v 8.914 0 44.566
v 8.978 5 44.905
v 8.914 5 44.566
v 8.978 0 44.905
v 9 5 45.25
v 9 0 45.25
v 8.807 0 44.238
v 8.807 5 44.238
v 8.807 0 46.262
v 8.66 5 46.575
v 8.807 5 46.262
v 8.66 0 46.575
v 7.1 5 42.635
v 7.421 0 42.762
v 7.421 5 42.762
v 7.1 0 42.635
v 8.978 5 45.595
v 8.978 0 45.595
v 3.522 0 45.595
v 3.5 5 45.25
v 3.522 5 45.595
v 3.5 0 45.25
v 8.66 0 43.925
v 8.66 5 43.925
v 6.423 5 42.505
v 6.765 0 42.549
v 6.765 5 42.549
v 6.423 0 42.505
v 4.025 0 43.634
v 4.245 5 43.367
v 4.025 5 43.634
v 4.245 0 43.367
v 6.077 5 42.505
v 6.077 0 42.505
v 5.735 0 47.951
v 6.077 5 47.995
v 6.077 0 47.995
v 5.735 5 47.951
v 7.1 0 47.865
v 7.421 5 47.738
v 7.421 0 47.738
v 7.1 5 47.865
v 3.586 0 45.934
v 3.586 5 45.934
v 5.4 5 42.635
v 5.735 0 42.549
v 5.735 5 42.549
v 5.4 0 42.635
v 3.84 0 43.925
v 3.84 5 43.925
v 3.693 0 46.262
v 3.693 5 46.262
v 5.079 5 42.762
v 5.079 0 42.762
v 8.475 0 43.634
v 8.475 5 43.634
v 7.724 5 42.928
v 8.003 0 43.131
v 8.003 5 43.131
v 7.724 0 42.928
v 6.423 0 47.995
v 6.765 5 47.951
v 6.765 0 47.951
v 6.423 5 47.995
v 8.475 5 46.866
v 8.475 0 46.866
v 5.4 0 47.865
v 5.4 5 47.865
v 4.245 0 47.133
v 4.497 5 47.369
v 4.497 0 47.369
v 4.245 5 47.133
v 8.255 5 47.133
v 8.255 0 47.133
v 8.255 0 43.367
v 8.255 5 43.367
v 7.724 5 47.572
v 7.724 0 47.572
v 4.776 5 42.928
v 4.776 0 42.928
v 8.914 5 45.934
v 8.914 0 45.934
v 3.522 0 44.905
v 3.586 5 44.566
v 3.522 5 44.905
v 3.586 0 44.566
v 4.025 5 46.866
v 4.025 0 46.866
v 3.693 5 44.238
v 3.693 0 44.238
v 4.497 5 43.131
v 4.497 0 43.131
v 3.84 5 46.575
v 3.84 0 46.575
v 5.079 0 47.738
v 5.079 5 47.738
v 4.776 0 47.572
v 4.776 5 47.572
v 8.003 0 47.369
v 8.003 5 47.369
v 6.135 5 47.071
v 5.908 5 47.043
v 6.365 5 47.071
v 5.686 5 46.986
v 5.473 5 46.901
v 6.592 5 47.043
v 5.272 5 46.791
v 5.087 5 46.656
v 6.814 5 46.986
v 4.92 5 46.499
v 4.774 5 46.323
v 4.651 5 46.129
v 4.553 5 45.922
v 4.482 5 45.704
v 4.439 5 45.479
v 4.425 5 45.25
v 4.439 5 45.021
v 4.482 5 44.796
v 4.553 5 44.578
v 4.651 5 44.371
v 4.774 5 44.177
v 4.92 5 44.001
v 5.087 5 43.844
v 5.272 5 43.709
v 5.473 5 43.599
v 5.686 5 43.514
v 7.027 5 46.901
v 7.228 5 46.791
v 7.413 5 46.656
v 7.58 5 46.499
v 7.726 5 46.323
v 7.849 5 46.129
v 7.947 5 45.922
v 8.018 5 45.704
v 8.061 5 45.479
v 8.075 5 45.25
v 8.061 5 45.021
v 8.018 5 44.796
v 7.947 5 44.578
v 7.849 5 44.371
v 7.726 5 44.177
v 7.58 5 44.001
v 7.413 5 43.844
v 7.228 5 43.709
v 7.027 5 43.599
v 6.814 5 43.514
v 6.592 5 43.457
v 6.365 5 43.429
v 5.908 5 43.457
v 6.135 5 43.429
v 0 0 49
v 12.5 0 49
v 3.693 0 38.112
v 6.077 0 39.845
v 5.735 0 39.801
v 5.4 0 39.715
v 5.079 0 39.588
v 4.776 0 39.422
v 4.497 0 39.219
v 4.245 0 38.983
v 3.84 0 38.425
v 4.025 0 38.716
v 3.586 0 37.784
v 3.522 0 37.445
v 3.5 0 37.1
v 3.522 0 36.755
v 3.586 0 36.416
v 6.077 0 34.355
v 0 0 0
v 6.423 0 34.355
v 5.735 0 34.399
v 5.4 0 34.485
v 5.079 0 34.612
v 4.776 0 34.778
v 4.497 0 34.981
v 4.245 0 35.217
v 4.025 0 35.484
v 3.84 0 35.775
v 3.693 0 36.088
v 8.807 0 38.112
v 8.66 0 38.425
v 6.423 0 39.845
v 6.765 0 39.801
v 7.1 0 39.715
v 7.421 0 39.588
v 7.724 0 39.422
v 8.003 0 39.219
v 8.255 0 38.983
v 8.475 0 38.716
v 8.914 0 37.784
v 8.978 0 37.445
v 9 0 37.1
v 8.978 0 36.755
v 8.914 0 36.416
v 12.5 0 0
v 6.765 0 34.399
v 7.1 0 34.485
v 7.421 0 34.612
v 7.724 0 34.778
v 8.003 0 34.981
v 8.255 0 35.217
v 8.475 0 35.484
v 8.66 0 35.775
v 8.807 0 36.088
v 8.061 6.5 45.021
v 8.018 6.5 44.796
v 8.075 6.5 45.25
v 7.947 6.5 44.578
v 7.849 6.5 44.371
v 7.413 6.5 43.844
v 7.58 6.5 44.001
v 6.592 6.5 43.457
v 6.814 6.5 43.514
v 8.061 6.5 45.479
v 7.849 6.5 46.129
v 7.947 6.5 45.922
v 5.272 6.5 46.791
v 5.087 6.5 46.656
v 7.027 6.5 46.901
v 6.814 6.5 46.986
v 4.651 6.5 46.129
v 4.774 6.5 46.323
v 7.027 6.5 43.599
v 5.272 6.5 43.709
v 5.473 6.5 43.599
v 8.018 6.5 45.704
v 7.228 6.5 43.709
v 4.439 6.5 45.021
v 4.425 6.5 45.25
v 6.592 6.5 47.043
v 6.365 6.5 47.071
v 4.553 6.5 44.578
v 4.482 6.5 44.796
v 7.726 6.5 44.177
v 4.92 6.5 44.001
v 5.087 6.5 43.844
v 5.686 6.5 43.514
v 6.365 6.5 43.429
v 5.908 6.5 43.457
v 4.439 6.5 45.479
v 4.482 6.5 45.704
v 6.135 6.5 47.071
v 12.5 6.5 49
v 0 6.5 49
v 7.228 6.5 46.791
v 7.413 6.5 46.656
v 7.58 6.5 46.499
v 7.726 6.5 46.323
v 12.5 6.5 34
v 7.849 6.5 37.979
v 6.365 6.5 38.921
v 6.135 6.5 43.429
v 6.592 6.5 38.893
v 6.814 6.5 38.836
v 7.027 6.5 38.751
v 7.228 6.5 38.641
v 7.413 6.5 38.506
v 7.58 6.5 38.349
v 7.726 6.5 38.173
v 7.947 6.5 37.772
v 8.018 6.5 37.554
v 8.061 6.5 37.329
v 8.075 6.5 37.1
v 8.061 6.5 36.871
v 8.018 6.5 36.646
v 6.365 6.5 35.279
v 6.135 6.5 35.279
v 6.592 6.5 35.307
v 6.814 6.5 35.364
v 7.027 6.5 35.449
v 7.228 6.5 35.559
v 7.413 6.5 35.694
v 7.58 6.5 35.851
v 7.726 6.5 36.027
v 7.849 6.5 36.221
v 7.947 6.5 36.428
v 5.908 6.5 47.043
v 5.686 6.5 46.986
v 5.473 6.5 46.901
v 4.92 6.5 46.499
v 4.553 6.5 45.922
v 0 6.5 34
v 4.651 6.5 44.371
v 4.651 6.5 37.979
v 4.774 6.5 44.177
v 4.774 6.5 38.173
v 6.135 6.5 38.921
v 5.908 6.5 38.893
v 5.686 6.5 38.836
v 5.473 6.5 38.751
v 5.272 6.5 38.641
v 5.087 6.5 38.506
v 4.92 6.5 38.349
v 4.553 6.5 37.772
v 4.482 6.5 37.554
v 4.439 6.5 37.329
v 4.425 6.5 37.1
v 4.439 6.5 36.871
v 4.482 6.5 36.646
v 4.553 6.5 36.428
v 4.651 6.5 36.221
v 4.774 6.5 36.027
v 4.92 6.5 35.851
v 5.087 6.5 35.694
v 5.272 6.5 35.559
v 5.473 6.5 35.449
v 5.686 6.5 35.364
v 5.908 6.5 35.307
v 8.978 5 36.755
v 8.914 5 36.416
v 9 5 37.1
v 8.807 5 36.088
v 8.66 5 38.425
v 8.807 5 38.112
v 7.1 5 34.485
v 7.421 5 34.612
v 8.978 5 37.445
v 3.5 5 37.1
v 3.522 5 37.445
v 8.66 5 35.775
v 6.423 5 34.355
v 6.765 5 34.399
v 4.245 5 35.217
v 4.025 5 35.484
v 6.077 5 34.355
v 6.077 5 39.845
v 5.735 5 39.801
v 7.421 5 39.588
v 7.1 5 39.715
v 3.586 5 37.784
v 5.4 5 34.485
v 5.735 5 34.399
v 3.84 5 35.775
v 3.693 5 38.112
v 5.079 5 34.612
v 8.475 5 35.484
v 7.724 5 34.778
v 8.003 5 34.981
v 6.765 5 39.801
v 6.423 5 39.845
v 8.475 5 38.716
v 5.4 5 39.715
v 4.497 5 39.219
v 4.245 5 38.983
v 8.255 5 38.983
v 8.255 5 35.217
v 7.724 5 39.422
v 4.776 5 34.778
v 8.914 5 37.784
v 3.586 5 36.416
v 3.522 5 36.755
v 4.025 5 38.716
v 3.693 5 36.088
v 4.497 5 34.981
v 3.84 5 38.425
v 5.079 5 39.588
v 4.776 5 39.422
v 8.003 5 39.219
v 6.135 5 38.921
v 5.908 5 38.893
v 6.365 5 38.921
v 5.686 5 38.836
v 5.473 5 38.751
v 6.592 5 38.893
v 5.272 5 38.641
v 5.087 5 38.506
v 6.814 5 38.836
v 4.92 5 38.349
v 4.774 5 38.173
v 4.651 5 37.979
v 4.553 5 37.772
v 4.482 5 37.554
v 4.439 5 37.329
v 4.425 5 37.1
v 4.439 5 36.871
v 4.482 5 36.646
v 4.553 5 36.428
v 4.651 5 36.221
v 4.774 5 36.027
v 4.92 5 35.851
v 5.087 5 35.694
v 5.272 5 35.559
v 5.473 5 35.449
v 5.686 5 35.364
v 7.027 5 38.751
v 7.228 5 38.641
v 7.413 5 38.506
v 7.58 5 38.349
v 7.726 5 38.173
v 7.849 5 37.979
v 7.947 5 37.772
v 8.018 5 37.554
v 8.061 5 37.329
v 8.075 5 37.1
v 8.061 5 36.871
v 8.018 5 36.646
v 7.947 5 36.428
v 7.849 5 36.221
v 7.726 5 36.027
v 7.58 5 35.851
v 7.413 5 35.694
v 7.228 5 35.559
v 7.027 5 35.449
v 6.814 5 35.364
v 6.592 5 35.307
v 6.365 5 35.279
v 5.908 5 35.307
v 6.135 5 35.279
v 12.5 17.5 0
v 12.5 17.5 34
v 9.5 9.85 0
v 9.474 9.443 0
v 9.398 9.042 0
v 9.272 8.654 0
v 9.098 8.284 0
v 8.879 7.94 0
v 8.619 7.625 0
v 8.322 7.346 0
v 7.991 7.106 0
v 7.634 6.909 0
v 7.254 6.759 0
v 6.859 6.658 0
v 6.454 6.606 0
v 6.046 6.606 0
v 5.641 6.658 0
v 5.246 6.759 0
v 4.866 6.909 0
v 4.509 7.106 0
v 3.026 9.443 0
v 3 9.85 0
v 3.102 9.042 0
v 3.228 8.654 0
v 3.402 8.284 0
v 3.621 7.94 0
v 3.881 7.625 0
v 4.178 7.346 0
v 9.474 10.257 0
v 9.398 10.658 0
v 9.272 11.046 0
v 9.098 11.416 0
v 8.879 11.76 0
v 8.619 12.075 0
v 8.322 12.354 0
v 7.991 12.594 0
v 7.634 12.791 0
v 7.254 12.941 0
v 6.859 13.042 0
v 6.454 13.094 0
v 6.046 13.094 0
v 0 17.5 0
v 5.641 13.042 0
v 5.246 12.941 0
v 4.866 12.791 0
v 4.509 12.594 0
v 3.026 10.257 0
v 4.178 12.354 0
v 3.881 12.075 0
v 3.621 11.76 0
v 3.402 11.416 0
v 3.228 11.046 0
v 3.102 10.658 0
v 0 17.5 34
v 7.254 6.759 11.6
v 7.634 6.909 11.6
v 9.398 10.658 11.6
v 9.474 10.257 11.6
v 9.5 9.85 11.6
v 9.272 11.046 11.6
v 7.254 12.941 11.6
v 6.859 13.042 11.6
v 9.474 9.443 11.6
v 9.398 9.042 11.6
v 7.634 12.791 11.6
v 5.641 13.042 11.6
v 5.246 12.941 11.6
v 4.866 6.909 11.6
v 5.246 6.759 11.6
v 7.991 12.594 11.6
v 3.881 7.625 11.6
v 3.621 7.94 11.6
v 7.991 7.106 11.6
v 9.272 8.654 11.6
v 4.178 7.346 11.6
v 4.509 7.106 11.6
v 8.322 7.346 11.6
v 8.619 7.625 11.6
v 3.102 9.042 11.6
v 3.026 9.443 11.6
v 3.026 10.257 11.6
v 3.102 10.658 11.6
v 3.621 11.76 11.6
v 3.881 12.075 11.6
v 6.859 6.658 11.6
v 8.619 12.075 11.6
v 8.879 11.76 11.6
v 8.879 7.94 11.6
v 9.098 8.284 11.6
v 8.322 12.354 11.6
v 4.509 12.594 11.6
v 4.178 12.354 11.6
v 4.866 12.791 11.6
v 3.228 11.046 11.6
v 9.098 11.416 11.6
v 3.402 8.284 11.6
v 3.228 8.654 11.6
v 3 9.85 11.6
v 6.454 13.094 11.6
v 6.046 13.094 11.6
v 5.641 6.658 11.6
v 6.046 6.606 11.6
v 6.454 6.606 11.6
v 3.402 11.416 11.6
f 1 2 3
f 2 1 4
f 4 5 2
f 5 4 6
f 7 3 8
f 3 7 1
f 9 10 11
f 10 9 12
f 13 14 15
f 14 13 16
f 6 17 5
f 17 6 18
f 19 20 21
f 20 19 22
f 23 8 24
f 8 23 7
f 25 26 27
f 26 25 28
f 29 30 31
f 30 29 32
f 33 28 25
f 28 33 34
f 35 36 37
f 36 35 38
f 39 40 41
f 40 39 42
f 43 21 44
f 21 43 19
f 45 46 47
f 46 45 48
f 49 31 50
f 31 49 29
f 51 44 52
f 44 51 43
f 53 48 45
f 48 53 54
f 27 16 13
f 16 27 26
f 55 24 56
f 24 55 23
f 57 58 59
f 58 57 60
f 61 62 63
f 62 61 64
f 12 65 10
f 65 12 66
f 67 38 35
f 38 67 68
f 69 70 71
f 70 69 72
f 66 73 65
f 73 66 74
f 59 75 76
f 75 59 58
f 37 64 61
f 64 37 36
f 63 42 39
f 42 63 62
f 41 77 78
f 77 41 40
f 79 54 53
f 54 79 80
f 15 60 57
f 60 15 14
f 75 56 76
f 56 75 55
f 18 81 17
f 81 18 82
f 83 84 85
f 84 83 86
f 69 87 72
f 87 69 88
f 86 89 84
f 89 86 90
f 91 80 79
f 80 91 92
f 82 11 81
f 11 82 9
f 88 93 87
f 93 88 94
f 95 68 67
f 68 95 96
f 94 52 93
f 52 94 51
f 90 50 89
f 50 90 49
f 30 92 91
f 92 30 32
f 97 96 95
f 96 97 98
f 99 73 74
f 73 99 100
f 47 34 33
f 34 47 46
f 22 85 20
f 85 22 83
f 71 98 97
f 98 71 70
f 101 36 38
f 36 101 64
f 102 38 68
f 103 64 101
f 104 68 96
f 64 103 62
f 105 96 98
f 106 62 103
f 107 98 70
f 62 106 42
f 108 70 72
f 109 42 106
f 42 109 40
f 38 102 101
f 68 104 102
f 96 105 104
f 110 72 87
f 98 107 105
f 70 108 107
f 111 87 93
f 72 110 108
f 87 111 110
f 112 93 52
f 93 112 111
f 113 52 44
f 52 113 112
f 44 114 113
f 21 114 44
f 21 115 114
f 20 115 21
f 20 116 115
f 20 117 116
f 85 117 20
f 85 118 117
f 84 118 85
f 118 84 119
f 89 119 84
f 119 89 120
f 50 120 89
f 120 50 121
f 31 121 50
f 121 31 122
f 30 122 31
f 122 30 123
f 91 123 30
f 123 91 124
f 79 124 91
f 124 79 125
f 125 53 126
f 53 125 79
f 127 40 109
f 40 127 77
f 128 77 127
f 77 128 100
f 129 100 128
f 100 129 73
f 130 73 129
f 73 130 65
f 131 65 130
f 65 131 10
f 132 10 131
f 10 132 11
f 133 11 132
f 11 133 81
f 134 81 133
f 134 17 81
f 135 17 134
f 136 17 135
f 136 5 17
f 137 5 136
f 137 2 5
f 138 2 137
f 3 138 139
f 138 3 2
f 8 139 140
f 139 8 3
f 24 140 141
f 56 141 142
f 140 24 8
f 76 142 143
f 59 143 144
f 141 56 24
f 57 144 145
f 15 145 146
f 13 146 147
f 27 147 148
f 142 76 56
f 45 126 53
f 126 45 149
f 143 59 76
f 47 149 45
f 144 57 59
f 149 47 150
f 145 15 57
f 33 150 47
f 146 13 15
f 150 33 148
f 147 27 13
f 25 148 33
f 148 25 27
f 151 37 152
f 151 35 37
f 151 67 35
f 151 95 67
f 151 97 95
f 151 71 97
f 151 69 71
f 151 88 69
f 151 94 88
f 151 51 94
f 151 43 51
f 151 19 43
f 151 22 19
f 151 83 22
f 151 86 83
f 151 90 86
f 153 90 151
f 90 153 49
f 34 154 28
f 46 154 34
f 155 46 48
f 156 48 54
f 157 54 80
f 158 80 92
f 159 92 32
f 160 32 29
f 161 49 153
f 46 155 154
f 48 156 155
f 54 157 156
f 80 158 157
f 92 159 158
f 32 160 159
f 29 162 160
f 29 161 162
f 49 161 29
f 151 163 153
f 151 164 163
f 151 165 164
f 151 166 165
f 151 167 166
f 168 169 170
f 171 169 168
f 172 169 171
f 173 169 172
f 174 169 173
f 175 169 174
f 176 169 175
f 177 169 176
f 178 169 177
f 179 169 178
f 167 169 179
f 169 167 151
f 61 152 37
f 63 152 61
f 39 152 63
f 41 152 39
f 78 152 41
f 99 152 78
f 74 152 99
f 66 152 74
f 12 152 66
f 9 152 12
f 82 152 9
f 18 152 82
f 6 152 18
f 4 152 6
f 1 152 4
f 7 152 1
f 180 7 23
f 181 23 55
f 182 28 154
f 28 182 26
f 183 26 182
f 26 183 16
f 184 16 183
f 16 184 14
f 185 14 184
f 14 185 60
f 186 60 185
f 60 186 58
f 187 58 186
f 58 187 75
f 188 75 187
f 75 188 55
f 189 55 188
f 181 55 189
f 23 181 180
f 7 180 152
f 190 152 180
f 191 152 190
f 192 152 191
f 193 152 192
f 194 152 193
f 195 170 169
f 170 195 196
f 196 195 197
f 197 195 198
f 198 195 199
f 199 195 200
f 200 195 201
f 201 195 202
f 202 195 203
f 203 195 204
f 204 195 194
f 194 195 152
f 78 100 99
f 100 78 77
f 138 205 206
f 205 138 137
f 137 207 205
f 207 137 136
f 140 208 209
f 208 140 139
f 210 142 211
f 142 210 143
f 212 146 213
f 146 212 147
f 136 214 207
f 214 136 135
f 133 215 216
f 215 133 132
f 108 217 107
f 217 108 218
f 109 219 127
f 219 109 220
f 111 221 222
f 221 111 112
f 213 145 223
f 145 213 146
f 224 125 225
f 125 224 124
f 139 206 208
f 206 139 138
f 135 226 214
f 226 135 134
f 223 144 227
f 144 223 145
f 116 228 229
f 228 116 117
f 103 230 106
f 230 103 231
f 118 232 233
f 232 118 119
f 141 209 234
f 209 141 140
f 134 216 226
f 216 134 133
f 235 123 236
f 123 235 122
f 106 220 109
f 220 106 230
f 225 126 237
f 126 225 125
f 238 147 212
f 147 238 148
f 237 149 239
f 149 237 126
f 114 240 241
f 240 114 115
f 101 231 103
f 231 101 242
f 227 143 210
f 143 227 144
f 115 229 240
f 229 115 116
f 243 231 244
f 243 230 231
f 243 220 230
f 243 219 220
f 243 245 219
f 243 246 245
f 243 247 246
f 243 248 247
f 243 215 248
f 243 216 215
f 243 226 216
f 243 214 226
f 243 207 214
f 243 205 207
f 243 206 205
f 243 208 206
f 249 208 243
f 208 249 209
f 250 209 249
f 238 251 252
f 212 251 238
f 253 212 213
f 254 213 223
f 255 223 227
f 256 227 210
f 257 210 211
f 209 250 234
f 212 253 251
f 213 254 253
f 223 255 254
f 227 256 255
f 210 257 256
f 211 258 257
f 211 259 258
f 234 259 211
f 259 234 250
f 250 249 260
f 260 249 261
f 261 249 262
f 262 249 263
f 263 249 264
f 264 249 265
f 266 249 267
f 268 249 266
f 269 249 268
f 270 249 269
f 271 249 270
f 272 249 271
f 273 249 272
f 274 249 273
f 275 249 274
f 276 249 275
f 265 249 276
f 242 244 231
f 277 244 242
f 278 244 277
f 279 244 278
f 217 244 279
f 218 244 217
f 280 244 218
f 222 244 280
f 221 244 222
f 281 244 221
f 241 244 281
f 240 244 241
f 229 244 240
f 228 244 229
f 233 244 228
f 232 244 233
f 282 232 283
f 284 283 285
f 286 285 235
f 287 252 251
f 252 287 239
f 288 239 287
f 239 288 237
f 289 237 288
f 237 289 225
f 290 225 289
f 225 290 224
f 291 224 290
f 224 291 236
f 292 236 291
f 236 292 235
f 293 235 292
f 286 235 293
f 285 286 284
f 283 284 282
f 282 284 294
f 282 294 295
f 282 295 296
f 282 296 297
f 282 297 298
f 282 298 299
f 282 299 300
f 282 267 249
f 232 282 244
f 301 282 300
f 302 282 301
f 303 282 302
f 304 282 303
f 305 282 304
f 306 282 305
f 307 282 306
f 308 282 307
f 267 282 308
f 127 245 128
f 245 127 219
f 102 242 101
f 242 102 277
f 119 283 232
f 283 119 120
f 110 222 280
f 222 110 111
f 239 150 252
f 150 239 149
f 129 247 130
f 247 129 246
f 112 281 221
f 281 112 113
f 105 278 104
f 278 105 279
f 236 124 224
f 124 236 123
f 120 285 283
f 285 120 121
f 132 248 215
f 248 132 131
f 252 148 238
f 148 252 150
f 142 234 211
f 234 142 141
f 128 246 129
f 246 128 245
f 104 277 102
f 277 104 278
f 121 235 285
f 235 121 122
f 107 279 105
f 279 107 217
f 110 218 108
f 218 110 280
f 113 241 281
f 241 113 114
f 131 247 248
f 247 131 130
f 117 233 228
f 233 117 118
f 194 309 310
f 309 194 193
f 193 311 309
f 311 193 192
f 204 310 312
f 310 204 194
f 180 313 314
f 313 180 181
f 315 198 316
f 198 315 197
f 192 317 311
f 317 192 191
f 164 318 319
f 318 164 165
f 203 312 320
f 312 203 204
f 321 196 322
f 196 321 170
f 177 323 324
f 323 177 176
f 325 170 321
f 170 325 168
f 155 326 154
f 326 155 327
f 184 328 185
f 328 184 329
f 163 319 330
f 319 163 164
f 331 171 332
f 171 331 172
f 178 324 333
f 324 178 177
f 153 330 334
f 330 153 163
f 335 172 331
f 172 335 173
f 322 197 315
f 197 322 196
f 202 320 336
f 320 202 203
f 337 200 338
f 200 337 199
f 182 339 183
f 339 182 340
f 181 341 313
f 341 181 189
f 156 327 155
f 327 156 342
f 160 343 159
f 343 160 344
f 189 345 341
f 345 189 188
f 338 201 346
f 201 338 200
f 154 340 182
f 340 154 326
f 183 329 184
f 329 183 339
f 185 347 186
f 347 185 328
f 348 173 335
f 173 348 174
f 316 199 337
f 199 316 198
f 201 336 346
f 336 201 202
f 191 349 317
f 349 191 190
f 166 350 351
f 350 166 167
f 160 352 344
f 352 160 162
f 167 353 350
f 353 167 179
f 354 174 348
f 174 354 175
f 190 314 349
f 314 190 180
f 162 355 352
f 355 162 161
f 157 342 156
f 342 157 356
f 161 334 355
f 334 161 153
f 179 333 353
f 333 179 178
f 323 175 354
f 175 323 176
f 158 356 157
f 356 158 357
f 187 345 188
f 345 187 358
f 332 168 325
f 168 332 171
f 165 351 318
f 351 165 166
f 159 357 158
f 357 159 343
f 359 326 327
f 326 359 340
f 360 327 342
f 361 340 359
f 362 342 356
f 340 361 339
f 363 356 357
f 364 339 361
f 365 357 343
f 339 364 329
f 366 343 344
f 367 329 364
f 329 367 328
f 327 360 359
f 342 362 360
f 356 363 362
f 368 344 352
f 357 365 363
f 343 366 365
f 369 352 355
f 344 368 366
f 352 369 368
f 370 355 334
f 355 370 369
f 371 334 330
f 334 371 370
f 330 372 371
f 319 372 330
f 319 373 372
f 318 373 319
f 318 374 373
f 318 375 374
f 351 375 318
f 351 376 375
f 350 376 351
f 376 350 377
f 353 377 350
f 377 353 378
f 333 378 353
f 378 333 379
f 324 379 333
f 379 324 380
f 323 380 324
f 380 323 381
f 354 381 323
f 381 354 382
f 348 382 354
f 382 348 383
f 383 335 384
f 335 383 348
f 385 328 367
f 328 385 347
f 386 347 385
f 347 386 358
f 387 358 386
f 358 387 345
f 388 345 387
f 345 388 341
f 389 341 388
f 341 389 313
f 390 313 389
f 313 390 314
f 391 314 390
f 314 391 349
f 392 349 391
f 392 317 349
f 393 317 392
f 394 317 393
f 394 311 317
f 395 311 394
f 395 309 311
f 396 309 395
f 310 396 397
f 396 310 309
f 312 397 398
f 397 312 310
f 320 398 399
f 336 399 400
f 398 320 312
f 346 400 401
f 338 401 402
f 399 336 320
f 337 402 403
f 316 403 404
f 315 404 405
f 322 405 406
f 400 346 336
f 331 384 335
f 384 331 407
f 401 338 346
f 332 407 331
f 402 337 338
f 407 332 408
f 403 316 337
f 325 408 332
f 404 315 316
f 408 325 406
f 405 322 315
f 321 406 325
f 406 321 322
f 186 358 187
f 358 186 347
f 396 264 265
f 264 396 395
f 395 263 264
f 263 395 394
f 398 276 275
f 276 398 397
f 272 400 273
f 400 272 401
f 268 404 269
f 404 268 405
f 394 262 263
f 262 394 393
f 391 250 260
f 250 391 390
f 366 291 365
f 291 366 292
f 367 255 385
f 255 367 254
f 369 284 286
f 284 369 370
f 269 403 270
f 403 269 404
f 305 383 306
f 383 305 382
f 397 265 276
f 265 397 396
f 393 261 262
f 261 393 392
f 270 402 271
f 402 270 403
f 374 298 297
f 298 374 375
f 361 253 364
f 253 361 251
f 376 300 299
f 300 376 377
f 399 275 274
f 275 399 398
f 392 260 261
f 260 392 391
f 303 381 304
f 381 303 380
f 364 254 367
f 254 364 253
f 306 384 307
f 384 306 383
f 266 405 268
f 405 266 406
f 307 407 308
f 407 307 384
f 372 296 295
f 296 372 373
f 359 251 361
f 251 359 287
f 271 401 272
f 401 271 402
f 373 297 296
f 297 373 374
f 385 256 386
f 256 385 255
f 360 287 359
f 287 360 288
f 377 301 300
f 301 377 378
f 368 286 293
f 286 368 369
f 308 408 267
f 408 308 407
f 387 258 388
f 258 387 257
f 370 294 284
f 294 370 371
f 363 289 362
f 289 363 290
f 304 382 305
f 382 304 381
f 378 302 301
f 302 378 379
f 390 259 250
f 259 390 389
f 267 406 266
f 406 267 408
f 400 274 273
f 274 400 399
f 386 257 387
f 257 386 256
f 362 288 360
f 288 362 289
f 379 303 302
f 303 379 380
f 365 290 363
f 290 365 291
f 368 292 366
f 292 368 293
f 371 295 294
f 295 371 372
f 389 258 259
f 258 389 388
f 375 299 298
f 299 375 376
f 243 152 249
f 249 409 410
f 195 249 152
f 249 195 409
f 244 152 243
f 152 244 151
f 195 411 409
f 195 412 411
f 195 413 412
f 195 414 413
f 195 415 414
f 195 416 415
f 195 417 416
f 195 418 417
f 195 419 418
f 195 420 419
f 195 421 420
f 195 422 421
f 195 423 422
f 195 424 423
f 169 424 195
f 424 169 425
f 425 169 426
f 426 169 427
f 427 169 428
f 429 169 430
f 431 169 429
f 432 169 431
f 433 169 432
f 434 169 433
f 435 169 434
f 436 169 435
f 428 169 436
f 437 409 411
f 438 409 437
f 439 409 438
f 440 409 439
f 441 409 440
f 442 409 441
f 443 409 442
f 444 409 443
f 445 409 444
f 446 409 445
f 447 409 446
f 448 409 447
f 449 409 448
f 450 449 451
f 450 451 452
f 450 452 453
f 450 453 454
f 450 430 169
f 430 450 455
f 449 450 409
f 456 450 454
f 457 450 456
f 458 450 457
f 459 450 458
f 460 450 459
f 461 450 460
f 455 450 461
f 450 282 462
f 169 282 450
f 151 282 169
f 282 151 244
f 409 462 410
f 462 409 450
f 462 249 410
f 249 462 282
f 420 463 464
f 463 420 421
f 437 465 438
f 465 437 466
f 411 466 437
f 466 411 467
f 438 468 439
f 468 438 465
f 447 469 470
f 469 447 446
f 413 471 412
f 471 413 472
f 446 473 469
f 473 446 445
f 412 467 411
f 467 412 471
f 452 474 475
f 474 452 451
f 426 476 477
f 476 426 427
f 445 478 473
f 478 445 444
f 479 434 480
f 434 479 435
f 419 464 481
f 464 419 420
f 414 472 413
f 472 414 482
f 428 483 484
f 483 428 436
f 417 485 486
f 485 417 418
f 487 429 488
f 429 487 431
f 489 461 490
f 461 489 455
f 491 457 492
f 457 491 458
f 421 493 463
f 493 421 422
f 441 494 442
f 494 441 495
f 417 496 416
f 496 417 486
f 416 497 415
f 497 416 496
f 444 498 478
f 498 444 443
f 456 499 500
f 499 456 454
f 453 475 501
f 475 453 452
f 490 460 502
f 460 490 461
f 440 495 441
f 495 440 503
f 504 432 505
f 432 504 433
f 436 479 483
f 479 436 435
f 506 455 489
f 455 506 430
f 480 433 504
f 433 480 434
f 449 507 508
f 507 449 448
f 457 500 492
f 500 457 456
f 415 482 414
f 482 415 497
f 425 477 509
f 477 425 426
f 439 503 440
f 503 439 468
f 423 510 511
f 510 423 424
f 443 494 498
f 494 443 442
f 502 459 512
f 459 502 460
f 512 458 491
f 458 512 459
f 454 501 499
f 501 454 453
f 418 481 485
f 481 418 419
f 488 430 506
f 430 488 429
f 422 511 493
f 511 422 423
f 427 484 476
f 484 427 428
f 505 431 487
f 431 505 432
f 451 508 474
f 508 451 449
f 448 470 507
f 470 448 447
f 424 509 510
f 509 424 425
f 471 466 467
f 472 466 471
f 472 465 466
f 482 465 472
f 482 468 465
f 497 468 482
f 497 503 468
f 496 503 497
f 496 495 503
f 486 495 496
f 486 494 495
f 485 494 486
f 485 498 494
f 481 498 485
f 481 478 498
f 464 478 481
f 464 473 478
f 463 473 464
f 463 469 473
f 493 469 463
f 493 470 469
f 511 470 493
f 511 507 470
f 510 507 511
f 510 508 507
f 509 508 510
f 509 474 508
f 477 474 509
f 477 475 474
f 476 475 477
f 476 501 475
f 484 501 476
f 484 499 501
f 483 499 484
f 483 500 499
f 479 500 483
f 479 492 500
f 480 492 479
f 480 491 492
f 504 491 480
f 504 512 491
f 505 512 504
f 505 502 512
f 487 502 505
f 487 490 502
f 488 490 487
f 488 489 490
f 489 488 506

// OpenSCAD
// units in millimeters
//


clearance = 30; // [8:50]
//original spacer has 19 mm of clearance
// flask is 25.3mm high

/* [Hidden] */

resolution = 50;
width = 12.5;
depth = 17.5;

cut_height = 15;
cut_depth = 11;
cut_width = width;

microscope_lens = 4;

height = cut_height + clearance + microscope_lens; // original 38 mm

screw_distance = 8.15; // 11.65 and 4.65
screw_diameter = 5.5;
screw_inner_diameter = 3.65;
screw_depth = 5;

peg_diameter = 6.5;
peg_height = 11.6;
peg_distance_front = 6.6+peg_diameter/2;
//6.77 diameter 2.65

module body() {
    difference() {
        cube([width, depth, height], center = false);
        translate([0, depth-cut_depth, height-cut_height])
            cube([cut_width, cut_depth, cut_height], center = false);
        screws();
        translate([0, 0, -screw_distance]) screws();
        peg();
    }
}
module screws() {
    translate([width/2, 0, -screw_diameter/2+height-1]){
        rotate([-90, 0, 0]){
            cylinder(h = screw_depth, d = screw_diameter, $fn = resolution);
            cylinder(h = depth-cut_depth, d = screw_inner_diameter, $fn = resolution);
        }
    }
}

module peg() {
    translate([width/2, peg_distance_front, 0])
    cylinder(h = peg_height,d = peg_diameter , center=false, $fn = resolution);
}
body();
